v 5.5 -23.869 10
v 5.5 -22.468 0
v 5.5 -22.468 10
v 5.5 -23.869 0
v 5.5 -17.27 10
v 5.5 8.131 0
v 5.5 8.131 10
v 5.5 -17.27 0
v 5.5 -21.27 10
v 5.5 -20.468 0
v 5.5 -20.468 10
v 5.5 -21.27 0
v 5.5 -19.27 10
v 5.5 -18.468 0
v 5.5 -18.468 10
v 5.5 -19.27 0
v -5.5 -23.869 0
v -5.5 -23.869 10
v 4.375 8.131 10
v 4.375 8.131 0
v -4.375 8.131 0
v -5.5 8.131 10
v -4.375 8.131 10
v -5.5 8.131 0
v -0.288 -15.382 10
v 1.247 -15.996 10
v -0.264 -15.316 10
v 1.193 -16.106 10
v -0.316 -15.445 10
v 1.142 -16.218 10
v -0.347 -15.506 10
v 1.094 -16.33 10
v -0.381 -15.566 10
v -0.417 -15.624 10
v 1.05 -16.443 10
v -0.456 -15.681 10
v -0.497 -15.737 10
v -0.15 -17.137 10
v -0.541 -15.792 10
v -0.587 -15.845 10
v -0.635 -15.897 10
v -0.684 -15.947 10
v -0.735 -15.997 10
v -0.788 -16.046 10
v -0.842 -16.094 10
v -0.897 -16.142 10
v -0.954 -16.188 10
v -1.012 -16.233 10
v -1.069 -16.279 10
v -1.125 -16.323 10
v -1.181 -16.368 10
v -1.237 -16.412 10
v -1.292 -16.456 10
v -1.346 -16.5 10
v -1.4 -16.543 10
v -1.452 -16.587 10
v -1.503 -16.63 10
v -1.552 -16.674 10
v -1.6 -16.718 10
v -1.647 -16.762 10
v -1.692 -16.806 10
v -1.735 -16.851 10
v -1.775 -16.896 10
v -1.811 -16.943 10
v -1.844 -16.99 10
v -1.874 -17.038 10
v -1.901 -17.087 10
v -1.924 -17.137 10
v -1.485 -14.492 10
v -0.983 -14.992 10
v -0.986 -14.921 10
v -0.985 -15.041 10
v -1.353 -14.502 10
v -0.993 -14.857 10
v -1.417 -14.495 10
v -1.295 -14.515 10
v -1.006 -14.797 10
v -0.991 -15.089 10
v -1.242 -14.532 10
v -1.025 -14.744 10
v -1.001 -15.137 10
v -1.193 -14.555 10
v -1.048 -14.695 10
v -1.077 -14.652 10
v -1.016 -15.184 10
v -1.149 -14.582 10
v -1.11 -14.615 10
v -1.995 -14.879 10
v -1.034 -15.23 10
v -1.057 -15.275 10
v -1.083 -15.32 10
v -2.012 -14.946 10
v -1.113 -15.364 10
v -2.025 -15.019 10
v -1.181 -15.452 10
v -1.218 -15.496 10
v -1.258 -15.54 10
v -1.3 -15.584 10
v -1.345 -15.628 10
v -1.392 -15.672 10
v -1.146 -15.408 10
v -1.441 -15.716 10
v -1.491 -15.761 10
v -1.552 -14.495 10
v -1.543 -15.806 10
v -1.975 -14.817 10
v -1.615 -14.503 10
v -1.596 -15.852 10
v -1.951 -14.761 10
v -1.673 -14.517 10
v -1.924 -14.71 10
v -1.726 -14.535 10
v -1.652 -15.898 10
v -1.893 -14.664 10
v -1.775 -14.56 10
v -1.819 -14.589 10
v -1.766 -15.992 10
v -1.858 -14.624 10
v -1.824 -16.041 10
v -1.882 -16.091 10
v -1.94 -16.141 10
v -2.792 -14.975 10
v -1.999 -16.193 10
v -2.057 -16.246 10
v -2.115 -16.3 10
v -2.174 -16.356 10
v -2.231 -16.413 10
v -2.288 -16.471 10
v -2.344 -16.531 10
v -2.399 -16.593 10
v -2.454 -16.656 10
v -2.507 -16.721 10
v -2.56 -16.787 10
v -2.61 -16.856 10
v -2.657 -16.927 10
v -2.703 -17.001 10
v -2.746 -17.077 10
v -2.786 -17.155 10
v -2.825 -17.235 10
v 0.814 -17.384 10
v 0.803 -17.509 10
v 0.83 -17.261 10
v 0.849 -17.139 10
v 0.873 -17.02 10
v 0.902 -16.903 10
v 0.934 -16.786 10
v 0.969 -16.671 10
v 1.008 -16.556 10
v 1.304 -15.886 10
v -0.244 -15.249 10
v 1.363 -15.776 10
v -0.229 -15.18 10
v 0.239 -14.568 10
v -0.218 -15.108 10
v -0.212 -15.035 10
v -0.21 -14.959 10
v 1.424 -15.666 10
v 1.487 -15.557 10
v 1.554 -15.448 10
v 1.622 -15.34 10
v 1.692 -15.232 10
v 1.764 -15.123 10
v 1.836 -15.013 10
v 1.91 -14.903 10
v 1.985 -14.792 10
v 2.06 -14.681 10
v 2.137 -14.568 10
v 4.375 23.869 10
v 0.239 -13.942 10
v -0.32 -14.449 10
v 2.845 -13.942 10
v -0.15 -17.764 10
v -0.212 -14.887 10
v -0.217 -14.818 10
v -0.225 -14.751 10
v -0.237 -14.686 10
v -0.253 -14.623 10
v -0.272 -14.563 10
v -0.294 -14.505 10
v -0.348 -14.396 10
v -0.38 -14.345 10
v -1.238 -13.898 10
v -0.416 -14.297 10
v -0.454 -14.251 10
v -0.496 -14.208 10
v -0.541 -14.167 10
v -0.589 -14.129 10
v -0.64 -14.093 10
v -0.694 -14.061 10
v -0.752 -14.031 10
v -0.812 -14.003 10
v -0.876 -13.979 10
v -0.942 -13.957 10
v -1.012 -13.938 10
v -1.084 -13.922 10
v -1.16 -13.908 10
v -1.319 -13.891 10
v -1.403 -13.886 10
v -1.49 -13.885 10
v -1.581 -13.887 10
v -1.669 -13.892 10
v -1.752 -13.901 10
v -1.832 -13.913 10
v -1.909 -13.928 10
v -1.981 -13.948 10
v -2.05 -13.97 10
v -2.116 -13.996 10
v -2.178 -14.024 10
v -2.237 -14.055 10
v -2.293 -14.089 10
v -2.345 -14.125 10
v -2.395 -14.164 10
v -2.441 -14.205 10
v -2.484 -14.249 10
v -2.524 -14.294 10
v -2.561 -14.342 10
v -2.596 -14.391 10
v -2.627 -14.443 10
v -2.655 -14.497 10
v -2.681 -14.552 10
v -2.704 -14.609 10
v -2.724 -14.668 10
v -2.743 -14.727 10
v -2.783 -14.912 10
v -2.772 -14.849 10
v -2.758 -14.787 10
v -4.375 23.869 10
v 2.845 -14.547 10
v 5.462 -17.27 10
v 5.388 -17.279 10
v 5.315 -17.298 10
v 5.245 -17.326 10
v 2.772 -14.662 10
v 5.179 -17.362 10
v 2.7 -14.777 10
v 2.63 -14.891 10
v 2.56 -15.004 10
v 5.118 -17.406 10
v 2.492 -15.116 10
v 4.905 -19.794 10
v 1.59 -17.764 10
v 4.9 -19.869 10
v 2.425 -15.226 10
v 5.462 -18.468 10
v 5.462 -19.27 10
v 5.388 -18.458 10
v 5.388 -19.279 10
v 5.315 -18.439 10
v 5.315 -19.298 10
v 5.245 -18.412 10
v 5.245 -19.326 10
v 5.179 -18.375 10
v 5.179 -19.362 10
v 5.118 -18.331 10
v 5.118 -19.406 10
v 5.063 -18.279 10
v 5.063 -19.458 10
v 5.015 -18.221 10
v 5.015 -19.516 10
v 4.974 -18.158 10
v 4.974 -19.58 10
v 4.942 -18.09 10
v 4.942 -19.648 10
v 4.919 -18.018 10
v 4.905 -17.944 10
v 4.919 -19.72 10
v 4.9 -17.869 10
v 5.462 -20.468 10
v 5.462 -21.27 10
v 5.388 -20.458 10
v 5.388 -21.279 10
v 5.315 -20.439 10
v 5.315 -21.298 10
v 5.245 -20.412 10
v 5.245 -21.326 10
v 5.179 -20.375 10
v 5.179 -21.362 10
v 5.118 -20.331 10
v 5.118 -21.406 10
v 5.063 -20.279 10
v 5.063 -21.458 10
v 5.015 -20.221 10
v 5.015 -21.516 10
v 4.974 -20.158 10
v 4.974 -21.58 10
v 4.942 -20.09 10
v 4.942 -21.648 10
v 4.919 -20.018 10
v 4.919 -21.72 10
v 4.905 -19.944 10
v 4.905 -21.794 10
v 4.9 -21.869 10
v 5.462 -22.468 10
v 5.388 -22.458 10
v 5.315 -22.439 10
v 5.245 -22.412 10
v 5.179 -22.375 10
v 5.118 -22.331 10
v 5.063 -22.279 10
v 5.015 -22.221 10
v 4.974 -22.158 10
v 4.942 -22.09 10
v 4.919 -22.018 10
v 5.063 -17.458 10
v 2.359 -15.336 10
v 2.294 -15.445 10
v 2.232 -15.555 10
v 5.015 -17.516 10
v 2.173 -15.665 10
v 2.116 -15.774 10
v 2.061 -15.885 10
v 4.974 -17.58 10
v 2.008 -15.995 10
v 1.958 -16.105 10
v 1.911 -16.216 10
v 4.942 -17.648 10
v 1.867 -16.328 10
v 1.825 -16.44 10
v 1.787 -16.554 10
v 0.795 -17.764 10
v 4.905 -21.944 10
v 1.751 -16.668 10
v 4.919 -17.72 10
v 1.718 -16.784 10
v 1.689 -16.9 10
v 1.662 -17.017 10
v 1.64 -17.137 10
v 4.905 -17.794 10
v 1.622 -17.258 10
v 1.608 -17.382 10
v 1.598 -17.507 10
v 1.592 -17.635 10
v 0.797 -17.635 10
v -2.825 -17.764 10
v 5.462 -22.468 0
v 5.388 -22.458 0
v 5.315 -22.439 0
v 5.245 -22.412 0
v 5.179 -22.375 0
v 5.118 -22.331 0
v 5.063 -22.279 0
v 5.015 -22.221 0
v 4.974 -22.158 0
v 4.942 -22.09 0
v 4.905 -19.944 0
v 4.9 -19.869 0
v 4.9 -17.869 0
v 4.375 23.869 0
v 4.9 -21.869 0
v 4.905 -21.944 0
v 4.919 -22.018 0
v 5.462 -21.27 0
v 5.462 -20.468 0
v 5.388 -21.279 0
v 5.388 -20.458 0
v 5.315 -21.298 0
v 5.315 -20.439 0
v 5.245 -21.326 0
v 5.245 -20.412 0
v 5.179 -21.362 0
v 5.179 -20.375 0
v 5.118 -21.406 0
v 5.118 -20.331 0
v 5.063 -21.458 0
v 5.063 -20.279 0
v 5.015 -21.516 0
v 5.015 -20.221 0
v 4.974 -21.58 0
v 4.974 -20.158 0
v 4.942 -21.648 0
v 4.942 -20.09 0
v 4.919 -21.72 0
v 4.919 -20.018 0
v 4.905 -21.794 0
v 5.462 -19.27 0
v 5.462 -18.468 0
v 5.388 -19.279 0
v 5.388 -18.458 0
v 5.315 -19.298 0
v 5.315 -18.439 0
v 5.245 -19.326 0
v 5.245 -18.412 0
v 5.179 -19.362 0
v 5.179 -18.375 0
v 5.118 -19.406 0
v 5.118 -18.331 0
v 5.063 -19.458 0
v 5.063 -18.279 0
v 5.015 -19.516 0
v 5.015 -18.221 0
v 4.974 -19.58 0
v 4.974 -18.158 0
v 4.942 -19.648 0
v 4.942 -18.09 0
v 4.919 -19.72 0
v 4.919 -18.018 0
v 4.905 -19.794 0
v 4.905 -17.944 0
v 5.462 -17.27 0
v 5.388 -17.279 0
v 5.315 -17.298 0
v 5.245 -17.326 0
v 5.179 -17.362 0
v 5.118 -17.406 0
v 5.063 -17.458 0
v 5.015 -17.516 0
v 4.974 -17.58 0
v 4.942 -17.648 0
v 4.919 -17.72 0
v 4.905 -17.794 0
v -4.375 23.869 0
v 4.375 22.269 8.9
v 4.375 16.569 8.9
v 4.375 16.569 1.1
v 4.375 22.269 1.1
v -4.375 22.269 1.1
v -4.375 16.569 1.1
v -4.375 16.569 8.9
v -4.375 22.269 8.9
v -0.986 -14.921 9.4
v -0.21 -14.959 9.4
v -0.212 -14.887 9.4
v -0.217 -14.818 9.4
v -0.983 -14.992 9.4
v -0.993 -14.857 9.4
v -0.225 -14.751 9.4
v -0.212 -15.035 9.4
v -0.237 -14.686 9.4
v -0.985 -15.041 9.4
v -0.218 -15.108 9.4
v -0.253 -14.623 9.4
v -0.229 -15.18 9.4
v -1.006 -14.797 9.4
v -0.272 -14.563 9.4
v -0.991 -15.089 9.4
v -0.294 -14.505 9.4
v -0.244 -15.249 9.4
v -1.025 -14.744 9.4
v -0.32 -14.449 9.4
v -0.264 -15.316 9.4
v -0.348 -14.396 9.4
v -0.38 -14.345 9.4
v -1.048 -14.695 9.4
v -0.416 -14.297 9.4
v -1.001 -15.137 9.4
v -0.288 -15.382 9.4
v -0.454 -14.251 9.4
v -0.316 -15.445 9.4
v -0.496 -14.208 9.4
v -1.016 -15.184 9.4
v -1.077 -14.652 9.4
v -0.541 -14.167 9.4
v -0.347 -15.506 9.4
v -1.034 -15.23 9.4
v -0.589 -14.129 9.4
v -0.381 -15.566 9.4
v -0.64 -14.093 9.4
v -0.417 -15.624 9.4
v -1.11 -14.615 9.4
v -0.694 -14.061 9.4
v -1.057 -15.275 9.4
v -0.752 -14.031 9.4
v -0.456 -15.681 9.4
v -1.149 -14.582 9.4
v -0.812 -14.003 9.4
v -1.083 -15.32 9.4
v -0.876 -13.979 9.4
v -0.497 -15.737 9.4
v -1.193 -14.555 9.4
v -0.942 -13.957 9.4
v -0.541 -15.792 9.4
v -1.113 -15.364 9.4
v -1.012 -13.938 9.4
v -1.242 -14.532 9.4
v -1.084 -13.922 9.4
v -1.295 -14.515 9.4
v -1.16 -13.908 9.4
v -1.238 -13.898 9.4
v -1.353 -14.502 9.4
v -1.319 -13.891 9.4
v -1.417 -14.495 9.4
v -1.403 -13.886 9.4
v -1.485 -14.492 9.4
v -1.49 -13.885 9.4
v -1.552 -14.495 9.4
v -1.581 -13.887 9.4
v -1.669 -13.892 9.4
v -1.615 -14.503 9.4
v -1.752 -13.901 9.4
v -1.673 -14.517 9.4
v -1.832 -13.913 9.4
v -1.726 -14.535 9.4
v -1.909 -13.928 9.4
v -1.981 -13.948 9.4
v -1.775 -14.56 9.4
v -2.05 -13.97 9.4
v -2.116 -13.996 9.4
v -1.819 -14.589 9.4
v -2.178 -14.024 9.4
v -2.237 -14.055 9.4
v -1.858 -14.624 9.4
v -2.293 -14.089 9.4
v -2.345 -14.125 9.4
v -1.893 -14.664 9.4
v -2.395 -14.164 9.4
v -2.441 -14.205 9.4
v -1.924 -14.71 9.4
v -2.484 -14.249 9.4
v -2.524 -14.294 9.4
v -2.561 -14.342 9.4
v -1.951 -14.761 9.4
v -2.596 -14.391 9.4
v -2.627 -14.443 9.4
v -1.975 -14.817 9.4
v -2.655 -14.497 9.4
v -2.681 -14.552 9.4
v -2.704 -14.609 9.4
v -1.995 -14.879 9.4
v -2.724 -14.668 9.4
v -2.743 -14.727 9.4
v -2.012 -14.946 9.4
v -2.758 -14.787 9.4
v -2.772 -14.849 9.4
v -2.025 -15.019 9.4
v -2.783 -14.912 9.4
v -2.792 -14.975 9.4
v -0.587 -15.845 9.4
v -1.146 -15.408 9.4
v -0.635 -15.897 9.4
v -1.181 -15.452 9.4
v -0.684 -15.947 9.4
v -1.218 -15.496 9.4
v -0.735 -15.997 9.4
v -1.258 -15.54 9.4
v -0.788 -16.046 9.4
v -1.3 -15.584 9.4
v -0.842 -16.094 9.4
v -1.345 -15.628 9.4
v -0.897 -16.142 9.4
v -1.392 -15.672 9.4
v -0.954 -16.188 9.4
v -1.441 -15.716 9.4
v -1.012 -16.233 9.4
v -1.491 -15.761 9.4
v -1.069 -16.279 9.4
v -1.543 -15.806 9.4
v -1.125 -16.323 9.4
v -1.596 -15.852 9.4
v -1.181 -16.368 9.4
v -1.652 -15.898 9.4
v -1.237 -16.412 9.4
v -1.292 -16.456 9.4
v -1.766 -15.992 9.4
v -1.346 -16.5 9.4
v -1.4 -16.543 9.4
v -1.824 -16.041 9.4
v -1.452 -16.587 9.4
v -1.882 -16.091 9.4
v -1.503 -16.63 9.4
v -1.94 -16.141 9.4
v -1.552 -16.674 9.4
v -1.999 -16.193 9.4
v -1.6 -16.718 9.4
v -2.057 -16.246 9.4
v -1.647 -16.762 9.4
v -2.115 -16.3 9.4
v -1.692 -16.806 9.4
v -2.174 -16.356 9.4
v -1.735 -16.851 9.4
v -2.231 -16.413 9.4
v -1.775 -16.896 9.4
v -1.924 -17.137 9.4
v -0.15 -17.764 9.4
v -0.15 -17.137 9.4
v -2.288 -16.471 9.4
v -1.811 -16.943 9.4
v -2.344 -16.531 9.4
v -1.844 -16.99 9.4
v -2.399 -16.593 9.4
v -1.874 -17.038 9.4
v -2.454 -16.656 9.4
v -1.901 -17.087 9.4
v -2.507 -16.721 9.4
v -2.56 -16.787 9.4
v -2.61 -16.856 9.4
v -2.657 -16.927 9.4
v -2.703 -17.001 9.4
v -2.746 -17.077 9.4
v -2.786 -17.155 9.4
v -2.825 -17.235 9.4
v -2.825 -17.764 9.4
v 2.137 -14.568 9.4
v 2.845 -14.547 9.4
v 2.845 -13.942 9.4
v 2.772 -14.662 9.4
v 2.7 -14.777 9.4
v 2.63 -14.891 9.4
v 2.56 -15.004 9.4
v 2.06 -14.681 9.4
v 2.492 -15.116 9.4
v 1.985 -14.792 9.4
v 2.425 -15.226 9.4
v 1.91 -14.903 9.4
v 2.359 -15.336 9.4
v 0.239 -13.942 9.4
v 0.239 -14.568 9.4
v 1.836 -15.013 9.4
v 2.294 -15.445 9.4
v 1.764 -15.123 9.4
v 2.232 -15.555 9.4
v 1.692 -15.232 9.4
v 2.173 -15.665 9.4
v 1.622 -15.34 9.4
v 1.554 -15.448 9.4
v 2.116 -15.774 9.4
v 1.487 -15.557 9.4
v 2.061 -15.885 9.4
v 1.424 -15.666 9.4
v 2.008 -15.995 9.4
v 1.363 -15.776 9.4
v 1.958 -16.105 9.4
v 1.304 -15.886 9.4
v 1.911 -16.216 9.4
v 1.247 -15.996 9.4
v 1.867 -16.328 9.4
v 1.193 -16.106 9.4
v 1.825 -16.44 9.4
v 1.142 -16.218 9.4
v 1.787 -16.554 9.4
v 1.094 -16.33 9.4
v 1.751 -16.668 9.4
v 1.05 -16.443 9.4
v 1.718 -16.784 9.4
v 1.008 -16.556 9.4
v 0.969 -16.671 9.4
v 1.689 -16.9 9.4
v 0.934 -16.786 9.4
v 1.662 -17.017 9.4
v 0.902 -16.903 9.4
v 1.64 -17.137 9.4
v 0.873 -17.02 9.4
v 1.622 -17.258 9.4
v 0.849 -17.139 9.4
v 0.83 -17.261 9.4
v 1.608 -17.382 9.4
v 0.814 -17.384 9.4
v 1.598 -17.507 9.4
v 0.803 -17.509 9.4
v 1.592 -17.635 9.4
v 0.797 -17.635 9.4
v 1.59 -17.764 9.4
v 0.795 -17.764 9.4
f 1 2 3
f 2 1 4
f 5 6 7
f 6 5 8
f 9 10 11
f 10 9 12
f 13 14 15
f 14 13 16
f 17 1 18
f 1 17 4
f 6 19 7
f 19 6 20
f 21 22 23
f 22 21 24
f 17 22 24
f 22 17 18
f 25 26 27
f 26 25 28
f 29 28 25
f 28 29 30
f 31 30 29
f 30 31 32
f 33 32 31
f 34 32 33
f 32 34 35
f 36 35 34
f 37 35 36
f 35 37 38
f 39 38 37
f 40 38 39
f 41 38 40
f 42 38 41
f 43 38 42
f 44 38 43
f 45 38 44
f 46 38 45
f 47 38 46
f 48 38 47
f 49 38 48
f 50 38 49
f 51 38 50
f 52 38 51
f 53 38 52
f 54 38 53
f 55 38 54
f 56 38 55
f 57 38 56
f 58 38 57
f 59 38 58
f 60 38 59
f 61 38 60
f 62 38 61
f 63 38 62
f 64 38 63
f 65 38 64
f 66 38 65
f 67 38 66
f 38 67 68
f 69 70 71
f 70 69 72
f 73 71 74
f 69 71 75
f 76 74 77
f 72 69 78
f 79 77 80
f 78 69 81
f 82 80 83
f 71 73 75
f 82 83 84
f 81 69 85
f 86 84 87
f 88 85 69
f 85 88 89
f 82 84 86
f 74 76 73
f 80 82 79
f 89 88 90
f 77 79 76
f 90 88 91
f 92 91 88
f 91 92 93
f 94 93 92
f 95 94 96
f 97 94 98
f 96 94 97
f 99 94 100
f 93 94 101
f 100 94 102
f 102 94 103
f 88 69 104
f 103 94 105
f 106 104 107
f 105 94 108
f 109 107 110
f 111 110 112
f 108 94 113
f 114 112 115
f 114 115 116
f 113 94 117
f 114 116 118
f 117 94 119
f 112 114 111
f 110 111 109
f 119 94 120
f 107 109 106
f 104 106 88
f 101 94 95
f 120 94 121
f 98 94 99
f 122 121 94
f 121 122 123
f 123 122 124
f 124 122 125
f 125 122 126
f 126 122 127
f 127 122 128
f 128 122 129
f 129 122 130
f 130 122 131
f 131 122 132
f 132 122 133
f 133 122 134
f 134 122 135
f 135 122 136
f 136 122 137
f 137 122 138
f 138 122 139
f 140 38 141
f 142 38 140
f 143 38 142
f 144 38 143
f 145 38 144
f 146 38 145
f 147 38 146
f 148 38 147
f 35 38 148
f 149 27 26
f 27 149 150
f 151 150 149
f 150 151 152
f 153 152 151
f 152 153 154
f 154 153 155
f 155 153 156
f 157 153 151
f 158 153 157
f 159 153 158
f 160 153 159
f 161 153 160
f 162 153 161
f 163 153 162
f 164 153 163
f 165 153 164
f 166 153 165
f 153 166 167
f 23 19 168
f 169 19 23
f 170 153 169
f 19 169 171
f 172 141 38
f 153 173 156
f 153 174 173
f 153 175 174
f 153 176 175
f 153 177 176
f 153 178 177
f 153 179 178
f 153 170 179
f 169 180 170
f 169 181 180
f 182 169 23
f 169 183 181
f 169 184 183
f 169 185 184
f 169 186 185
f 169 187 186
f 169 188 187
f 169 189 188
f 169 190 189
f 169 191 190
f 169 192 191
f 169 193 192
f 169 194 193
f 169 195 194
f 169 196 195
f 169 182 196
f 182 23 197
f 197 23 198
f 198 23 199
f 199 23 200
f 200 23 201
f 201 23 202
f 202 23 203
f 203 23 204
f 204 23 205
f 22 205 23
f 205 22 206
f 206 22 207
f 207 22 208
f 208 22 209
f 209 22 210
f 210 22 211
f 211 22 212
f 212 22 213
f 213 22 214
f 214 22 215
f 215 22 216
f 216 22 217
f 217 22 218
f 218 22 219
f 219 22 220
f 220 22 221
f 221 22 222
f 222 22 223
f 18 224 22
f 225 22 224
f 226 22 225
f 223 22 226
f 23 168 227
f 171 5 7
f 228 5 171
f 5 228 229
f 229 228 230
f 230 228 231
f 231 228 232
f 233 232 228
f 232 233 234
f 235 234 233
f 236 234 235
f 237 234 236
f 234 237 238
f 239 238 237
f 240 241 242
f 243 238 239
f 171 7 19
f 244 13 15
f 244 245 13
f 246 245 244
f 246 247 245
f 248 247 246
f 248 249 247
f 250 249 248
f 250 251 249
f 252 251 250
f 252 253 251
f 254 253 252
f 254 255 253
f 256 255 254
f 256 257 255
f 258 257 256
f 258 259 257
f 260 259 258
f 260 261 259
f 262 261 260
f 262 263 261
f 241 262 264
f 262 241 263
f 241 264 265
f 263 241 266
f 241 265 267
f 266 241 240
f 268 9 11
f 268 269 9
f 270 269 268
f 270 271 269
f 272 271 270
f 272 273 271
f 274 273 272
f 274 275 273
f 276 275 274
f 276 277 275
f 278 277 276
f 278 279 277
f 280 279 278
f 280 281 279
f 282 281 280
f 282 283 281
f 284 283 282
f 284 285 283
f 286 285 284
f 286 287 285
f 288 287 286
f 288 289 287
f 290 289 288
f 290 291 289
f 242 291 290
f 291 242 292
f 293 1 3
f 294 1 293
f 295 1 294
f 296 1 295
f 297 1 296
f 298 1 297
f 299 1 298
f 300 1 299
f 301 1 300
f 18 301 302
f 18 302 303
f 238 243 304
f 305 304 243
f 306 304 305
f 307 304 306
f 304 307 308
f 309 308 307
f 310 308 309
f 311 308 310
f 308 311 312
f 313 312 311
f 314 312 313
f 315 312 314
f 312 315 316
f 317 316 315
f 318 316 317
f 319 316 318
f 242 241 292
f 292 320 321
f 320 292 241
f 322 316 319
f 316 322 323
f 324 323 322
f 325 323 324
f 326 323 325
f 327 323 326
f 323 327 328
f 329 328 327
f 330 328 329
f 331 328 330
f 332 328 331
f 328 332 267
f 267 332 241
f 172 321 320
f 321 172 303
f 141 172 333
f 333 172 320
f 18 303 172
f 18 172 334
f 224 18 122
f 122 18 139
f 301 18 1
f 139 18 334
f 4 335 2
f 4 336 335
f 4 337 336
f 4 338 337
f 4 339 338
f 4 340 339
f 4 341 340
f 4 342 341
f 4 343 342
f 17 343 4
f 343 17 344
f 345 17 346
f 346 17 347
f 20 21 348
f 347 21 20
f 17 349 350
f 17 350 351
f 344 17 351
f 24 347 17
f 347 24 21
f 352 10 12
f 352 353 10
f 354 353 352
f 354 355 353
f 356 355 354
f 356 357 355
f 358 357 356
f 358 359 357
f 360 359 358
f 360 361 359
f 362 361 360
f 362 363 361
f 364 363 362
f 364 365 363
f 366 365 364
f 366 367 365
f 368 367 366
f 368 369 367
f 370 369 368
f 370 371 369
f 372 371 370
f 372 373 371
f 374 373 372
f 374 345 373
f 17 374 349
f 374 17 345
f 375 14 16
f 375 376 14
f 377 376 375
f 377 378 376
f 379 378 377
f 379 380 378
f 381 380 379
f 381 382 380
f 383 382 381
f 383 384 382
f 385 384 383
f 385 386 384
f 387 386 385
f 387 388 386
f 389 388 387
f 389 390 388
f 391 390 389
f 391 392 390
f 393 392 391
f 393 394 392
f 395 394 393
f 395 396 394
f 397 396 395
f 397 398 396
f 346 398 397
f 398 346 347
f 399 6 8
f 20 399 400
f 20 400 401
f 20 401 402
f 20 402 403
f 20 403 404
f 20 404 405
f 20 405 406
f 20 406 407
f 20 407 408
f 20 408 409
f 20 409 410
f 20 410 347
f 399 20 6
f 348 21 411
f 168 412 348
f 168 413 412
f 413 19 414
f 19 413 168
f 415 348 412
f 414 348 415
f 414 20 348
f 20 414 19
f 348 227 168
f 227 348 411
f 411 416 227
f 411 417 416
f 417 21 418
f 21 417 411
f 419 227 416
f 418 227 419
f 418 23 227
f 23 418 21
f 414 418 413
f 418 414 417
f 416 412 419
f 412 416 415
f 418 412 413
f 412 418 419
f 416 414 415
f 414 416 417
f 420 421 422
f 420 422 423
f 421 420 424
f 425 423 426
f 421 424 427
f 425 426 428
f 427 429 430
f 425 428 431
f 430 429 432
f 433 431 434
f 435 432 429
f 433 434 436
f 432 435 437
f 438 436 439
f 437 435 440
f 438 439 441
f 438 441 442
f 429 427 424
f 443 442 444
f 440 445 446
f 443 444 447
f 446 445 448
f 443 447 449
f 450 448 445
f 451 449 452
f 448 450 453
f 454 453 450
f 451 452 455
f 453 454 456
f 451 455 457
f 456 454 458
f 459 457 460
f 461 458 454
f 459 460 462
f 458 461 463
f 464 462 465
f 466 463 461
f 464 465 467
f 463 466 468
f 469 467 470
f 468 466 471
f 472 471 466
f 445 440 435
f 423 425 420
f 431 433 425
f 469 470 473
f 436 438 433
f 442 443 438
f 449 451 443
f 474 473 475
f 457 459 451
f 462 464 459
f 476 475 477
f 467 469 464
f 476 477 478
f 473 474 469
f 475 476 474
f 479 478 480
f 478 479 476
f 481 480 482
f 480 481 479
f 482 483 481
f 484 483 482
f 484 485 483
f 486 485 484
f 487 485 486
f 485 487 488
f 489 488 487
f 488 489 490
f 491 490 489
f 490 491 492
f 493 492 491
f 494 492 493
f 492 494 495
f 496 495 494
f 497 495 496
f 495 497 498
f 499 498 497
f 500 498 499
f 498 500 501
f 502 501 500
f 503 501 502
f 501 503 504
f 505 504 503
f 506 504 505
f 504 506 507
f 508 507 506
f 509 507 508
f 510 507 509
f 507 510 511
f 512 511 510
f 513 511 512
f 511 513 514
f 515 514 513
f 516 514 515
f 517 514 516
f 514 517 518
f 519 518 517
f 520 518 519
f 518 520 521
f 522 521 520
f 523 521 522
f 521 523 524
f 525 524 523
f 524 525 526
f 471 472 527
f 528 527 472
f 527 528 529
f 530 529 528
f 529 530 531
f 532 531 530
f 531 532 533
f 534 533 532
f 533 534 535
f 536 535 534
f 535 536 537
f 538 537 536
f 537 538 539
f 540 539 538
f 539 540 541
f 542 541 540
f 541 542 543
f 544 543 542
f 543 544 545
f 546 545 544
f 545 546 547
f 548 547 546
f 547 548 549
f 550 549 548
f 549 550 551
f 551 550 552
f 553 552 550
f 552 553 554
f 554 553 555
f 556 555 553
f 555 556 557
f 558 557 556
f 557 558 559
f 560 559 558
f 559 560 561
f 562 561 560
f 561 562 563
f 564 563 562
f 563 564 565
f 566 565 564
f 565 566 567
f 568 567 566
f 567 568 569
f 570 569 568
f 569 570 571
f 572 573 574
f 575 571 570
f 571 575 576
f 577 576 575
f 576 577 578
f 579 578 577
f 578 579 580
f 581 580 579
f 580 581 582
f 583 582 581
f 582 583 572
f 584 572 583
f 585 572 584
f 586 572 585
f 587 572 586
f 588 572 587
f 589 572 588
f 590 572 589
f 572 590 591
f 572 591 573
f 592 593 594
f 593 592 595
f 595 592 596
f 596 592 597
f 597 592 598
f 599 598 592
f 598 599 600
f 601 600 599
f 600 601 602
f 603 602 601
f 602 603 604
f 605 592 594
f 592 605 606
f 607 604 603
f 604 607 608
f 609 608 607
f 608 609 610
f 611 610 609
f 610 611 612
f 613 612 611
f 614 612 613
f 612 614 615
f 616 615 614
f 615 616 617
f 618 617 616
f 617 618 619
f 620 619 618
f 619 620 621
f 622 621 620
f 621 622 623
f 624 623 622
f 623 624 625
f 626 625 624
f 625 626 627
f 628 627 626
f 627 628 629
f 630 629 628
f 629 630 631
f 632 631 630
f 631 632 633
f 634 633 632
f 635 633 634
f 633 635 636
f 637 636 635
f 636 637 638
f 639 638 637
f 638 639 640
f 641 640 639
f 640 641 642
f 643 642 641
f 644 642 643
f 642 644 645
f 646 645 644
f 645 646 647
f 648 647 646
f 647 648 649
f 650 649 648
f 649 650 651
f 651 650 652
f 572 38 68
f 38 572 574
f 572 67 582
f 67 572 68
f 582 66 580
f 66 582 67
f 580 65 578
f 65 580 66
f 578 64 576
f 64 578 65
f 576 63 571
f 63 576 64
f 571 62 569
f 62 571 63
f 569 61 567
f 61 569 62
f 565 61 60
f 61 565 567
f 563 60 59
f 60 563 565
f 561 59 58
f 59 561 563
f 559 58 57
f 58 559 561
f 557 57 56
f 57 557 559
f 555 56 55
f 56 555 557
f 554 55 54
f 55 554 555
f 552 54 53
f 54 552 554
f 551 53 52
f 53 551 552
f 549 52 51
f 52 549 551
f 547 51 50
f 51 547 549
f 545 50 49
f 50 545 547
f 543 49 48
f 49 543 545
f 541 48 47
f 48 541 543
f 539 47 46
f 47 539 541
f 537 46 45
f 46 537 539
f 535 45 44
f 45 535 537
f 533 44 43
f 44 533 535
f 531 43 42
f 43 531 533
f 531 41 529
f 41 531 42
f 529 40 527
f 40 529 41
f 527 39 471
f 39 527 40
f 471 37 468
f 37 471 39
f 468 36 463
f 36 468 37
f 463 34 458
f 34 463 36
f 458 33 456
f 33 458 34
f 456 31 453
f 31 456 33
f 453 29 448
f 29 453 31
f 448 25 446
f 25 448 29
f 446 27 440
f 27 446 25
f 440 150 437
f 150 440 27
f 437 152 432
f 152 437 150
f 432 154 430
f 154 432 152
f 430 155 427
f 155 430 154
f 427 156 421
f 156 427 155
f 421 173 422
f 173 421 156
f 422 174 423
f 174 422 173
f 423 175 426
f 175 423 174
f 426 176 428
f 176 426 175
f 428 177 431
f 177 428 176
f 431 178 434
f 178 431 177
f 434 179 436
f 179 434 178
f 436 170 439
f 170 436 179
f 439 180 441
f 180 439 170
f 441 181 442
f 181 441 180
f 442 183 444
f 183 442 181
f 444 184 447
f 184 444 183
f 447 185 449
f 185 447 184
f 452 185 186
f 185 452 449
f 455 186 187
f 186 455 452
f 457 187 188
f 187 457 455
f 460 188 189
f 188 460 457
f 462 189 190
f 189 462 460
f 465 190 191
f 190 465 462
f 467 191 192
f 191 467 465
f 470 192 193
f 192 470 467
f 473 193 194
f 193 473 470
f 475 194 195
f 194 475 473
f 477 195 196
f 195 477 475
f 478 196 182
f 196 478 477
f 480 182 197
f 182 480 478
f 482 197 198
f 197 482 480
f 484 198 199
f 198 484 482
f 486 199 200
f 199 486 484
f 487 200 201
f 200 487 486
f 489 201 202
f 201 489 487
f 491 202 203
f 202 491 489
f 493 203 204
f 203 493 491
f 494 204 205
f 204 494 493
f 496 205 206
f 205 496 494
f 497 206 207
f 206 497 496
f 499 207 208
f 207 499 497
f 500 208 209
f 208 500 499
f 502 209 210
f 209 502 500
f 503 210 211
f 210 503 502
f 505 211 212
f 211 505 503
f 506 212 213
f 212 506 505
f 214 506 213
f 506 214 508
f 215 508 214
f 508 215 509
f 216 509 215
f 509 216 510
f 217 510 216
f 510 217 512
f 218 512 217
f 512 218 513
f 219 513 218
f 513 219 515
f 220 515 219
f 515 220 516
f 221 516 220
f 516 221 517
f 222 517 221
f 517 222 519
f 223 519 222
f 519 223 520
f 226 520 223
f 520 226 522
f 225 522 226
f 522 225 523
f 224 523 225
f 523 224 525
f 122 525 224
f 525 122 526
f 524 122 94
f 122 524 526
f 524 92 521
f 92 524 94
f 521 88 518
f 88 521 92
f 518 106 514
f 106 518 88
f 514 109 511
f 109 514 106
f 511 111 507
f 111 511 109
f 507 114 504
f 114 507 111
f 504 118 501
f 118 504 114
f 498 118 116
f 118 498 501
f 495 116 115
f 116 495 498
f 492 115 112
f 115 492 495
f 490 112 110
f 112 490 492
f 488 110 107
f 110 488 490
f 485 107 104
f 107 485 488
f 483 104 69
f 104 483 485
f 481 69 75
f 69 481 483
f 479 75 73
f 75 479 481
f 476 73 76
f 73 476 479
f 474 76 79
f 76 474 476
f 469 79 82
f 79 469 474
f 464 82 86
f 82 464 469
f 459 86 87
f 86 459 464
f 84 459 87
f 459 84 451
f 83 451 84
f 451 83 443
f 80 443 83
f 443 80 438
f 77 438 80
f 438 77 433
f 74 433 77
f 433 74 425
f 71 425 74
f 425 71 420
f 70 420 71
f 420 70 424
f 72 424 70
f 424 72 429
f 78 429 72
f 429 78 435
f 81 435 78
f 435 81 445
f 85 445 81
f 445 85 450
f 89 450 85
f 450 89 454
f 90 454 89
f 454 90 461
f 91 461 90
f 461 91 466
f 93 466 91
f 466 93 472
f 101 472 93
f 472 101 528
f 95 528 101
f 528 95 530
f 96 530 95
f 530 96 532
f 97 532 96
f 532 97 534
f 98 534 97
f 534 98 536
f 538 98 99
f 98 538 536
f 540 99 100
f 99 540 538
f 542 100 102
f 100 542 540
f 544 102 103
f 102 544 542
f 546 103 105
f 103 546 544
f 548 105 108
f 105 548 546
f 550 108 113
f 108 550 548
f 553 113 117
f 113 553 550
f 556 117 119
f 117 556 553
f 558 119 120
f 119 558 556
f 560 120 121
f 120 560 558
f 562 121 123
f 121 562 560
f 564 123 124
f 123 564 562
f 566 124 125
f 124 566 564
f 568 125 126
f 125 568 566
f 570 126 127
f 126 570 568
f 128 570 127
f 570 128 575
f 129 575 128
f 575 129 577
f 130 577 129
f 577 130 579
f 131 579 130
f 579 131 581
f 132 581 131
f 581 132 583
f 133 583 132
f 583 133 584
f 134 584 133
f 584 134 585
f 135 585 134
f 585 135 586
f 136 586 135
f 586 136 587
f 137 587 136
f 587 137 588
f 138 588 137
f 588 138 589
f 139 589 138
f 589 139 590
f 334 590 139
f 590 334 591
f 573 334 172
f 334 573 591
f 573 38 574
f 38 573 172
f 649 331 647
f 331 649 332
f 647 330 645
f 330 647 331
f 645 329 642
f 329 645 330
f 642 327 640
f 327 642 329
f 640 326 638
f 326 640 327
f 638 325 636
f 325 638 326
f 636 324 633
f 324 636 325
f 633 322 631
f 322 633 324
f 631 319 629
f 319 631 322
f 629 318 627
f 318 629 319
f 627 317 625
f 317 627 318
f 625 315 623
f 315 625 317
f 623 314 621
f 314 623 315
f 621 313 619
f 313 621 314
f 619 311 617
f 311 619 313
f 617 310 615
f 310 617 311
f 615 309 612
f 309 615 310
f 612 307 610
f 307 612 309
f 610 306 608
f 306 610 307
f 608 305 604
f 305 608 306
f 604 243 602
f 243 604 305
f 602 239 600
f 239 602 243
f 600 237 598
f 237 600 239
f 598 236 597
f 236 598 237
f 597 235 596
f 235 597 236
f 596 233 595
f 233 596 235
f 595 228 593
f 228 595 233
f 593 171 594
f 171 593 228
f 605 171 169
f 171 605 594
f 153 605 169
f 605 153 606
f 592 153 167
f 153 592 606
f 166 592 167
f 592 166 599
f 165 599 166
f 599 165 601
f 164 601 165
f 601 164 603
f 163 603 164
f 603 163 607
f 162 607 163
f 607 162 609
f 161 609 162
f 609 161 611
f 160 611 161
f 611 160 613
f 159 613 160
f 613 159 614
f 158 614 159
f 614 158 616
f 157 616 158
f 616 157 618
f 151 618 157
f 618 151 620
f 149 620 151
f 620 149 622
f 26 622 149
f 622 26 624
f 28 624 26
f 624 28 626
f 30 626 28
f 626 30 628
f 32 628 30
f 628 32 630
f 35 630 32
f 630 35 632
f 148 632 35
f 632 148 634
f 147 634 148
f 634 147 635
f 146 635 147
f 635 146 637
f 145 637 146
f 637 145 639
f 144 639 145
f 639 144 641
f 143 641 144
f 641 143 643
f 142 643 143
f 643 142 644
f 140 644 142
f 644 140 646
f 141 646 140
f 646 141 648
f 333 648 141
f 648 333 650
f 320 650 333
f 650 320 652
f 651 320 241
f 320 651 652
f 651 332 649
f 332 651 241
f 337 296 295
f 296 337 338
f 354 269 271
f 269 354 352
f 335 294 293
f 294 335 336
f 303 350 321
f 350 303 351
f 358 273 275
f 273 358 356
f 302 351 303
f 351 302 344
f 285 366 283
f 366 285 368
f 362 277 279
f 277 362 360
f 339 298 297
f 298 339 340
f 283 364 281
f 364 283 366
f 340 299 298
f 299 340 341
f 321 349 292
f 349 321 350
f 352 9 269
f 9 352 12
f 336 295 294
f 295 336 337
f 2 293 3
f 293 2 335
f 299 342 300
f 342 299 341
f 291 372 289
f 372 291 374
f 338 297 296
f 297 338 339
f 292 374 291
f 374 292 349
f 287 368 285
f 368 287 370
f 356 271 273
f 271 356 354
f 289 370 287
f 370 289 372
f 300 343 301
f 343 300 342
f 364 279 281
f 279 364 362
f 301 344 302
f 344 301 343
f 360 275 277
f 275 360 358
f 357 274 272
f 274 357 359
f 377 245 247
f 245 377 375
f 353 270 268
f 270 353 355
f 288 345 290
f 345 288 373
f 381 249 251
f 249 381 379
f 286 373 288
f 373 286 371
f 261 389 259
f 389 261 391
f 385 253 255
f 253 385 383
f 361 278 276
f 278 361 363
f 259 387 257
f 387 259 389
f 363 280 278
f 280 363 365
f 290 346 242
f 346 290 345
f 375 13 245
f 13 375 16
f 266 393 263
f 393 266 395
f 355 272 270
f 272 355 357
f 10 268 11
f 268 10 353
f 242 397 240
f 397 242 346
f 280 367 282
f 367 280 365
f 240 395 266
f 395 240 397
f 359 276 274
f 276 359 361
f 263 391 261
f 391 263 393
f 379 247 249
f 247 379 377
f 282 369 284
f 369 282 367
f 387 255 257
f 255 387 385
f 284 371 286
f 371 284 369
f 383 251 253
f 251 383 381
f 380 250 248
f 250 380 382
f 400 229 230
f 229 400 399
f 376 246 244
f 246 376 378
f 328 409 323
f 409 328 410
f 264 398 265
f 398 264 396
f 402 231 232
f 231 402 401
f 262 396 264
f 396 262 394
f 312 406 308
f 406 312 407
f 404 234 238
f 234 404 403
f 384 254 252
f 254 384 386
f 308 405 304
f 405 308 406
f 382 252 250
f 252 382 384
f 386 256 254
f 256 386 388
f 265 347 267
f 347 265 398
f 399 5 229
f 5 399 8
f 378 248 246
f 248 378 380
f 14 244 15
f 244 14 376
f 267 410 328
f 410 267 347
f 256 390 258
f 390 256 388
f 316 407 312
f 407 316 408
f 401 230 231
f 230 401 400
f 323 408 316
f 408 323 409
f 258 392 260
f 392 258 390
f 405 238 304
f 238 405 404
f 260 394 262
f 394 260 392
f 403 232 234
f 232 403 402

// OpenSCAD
$fn = 50;

difference() {
	union() {
		translate(v = [0, 8.131250000000001, 0]) {
			rotate(a = [90, 0, 0]) {
				difference() {
					union() {
						translate(v = [-5.5, 0, 0]) {
							cube(size = [11.0, 10.0, 32.0]);
						}
						translate(v = [-4.375, 0, -15.737499999999997]) {
							cube(size = [8.75, 10.0, 15.837499999999997]);
						}
					}
					union() {
						translate(v = [-4.475, 1.1, -14.137499999999998]) {
							cube(size = [8.95, 7.8, 5.7]);
						}
						translate(v = [0, 9.4, 24.0]) {
							rotate(a = [-90, 0, 0]) {
								linear_extrude(height = 0.7) {
									text(font = "Arial:style=Bold", halign = "center", size = 4.0, text = "27", valign = "center");
								}
							}
						}
						translate(v = [5.5, 10.1, 30.0]) {
							rotate(a = [90, 0, 0]) {
								cylinder(h = 10.2, r = 0.6);
							}
						}
						translate(v = [5.5, 10.1, 28.0]) {
							rotate(a = [90, 0, 0]) {
								cylinder(h = 10.2, r = 0.6);
							}
						}
						translate(v = [5.5, 10.1, 26.0]) {
							rotate(a = [90, 0, 0]) {
								cylinder(h = 10.2, r = 0.6);
							}
						}
					}
				}
			}
		}
	}
	union();
}
